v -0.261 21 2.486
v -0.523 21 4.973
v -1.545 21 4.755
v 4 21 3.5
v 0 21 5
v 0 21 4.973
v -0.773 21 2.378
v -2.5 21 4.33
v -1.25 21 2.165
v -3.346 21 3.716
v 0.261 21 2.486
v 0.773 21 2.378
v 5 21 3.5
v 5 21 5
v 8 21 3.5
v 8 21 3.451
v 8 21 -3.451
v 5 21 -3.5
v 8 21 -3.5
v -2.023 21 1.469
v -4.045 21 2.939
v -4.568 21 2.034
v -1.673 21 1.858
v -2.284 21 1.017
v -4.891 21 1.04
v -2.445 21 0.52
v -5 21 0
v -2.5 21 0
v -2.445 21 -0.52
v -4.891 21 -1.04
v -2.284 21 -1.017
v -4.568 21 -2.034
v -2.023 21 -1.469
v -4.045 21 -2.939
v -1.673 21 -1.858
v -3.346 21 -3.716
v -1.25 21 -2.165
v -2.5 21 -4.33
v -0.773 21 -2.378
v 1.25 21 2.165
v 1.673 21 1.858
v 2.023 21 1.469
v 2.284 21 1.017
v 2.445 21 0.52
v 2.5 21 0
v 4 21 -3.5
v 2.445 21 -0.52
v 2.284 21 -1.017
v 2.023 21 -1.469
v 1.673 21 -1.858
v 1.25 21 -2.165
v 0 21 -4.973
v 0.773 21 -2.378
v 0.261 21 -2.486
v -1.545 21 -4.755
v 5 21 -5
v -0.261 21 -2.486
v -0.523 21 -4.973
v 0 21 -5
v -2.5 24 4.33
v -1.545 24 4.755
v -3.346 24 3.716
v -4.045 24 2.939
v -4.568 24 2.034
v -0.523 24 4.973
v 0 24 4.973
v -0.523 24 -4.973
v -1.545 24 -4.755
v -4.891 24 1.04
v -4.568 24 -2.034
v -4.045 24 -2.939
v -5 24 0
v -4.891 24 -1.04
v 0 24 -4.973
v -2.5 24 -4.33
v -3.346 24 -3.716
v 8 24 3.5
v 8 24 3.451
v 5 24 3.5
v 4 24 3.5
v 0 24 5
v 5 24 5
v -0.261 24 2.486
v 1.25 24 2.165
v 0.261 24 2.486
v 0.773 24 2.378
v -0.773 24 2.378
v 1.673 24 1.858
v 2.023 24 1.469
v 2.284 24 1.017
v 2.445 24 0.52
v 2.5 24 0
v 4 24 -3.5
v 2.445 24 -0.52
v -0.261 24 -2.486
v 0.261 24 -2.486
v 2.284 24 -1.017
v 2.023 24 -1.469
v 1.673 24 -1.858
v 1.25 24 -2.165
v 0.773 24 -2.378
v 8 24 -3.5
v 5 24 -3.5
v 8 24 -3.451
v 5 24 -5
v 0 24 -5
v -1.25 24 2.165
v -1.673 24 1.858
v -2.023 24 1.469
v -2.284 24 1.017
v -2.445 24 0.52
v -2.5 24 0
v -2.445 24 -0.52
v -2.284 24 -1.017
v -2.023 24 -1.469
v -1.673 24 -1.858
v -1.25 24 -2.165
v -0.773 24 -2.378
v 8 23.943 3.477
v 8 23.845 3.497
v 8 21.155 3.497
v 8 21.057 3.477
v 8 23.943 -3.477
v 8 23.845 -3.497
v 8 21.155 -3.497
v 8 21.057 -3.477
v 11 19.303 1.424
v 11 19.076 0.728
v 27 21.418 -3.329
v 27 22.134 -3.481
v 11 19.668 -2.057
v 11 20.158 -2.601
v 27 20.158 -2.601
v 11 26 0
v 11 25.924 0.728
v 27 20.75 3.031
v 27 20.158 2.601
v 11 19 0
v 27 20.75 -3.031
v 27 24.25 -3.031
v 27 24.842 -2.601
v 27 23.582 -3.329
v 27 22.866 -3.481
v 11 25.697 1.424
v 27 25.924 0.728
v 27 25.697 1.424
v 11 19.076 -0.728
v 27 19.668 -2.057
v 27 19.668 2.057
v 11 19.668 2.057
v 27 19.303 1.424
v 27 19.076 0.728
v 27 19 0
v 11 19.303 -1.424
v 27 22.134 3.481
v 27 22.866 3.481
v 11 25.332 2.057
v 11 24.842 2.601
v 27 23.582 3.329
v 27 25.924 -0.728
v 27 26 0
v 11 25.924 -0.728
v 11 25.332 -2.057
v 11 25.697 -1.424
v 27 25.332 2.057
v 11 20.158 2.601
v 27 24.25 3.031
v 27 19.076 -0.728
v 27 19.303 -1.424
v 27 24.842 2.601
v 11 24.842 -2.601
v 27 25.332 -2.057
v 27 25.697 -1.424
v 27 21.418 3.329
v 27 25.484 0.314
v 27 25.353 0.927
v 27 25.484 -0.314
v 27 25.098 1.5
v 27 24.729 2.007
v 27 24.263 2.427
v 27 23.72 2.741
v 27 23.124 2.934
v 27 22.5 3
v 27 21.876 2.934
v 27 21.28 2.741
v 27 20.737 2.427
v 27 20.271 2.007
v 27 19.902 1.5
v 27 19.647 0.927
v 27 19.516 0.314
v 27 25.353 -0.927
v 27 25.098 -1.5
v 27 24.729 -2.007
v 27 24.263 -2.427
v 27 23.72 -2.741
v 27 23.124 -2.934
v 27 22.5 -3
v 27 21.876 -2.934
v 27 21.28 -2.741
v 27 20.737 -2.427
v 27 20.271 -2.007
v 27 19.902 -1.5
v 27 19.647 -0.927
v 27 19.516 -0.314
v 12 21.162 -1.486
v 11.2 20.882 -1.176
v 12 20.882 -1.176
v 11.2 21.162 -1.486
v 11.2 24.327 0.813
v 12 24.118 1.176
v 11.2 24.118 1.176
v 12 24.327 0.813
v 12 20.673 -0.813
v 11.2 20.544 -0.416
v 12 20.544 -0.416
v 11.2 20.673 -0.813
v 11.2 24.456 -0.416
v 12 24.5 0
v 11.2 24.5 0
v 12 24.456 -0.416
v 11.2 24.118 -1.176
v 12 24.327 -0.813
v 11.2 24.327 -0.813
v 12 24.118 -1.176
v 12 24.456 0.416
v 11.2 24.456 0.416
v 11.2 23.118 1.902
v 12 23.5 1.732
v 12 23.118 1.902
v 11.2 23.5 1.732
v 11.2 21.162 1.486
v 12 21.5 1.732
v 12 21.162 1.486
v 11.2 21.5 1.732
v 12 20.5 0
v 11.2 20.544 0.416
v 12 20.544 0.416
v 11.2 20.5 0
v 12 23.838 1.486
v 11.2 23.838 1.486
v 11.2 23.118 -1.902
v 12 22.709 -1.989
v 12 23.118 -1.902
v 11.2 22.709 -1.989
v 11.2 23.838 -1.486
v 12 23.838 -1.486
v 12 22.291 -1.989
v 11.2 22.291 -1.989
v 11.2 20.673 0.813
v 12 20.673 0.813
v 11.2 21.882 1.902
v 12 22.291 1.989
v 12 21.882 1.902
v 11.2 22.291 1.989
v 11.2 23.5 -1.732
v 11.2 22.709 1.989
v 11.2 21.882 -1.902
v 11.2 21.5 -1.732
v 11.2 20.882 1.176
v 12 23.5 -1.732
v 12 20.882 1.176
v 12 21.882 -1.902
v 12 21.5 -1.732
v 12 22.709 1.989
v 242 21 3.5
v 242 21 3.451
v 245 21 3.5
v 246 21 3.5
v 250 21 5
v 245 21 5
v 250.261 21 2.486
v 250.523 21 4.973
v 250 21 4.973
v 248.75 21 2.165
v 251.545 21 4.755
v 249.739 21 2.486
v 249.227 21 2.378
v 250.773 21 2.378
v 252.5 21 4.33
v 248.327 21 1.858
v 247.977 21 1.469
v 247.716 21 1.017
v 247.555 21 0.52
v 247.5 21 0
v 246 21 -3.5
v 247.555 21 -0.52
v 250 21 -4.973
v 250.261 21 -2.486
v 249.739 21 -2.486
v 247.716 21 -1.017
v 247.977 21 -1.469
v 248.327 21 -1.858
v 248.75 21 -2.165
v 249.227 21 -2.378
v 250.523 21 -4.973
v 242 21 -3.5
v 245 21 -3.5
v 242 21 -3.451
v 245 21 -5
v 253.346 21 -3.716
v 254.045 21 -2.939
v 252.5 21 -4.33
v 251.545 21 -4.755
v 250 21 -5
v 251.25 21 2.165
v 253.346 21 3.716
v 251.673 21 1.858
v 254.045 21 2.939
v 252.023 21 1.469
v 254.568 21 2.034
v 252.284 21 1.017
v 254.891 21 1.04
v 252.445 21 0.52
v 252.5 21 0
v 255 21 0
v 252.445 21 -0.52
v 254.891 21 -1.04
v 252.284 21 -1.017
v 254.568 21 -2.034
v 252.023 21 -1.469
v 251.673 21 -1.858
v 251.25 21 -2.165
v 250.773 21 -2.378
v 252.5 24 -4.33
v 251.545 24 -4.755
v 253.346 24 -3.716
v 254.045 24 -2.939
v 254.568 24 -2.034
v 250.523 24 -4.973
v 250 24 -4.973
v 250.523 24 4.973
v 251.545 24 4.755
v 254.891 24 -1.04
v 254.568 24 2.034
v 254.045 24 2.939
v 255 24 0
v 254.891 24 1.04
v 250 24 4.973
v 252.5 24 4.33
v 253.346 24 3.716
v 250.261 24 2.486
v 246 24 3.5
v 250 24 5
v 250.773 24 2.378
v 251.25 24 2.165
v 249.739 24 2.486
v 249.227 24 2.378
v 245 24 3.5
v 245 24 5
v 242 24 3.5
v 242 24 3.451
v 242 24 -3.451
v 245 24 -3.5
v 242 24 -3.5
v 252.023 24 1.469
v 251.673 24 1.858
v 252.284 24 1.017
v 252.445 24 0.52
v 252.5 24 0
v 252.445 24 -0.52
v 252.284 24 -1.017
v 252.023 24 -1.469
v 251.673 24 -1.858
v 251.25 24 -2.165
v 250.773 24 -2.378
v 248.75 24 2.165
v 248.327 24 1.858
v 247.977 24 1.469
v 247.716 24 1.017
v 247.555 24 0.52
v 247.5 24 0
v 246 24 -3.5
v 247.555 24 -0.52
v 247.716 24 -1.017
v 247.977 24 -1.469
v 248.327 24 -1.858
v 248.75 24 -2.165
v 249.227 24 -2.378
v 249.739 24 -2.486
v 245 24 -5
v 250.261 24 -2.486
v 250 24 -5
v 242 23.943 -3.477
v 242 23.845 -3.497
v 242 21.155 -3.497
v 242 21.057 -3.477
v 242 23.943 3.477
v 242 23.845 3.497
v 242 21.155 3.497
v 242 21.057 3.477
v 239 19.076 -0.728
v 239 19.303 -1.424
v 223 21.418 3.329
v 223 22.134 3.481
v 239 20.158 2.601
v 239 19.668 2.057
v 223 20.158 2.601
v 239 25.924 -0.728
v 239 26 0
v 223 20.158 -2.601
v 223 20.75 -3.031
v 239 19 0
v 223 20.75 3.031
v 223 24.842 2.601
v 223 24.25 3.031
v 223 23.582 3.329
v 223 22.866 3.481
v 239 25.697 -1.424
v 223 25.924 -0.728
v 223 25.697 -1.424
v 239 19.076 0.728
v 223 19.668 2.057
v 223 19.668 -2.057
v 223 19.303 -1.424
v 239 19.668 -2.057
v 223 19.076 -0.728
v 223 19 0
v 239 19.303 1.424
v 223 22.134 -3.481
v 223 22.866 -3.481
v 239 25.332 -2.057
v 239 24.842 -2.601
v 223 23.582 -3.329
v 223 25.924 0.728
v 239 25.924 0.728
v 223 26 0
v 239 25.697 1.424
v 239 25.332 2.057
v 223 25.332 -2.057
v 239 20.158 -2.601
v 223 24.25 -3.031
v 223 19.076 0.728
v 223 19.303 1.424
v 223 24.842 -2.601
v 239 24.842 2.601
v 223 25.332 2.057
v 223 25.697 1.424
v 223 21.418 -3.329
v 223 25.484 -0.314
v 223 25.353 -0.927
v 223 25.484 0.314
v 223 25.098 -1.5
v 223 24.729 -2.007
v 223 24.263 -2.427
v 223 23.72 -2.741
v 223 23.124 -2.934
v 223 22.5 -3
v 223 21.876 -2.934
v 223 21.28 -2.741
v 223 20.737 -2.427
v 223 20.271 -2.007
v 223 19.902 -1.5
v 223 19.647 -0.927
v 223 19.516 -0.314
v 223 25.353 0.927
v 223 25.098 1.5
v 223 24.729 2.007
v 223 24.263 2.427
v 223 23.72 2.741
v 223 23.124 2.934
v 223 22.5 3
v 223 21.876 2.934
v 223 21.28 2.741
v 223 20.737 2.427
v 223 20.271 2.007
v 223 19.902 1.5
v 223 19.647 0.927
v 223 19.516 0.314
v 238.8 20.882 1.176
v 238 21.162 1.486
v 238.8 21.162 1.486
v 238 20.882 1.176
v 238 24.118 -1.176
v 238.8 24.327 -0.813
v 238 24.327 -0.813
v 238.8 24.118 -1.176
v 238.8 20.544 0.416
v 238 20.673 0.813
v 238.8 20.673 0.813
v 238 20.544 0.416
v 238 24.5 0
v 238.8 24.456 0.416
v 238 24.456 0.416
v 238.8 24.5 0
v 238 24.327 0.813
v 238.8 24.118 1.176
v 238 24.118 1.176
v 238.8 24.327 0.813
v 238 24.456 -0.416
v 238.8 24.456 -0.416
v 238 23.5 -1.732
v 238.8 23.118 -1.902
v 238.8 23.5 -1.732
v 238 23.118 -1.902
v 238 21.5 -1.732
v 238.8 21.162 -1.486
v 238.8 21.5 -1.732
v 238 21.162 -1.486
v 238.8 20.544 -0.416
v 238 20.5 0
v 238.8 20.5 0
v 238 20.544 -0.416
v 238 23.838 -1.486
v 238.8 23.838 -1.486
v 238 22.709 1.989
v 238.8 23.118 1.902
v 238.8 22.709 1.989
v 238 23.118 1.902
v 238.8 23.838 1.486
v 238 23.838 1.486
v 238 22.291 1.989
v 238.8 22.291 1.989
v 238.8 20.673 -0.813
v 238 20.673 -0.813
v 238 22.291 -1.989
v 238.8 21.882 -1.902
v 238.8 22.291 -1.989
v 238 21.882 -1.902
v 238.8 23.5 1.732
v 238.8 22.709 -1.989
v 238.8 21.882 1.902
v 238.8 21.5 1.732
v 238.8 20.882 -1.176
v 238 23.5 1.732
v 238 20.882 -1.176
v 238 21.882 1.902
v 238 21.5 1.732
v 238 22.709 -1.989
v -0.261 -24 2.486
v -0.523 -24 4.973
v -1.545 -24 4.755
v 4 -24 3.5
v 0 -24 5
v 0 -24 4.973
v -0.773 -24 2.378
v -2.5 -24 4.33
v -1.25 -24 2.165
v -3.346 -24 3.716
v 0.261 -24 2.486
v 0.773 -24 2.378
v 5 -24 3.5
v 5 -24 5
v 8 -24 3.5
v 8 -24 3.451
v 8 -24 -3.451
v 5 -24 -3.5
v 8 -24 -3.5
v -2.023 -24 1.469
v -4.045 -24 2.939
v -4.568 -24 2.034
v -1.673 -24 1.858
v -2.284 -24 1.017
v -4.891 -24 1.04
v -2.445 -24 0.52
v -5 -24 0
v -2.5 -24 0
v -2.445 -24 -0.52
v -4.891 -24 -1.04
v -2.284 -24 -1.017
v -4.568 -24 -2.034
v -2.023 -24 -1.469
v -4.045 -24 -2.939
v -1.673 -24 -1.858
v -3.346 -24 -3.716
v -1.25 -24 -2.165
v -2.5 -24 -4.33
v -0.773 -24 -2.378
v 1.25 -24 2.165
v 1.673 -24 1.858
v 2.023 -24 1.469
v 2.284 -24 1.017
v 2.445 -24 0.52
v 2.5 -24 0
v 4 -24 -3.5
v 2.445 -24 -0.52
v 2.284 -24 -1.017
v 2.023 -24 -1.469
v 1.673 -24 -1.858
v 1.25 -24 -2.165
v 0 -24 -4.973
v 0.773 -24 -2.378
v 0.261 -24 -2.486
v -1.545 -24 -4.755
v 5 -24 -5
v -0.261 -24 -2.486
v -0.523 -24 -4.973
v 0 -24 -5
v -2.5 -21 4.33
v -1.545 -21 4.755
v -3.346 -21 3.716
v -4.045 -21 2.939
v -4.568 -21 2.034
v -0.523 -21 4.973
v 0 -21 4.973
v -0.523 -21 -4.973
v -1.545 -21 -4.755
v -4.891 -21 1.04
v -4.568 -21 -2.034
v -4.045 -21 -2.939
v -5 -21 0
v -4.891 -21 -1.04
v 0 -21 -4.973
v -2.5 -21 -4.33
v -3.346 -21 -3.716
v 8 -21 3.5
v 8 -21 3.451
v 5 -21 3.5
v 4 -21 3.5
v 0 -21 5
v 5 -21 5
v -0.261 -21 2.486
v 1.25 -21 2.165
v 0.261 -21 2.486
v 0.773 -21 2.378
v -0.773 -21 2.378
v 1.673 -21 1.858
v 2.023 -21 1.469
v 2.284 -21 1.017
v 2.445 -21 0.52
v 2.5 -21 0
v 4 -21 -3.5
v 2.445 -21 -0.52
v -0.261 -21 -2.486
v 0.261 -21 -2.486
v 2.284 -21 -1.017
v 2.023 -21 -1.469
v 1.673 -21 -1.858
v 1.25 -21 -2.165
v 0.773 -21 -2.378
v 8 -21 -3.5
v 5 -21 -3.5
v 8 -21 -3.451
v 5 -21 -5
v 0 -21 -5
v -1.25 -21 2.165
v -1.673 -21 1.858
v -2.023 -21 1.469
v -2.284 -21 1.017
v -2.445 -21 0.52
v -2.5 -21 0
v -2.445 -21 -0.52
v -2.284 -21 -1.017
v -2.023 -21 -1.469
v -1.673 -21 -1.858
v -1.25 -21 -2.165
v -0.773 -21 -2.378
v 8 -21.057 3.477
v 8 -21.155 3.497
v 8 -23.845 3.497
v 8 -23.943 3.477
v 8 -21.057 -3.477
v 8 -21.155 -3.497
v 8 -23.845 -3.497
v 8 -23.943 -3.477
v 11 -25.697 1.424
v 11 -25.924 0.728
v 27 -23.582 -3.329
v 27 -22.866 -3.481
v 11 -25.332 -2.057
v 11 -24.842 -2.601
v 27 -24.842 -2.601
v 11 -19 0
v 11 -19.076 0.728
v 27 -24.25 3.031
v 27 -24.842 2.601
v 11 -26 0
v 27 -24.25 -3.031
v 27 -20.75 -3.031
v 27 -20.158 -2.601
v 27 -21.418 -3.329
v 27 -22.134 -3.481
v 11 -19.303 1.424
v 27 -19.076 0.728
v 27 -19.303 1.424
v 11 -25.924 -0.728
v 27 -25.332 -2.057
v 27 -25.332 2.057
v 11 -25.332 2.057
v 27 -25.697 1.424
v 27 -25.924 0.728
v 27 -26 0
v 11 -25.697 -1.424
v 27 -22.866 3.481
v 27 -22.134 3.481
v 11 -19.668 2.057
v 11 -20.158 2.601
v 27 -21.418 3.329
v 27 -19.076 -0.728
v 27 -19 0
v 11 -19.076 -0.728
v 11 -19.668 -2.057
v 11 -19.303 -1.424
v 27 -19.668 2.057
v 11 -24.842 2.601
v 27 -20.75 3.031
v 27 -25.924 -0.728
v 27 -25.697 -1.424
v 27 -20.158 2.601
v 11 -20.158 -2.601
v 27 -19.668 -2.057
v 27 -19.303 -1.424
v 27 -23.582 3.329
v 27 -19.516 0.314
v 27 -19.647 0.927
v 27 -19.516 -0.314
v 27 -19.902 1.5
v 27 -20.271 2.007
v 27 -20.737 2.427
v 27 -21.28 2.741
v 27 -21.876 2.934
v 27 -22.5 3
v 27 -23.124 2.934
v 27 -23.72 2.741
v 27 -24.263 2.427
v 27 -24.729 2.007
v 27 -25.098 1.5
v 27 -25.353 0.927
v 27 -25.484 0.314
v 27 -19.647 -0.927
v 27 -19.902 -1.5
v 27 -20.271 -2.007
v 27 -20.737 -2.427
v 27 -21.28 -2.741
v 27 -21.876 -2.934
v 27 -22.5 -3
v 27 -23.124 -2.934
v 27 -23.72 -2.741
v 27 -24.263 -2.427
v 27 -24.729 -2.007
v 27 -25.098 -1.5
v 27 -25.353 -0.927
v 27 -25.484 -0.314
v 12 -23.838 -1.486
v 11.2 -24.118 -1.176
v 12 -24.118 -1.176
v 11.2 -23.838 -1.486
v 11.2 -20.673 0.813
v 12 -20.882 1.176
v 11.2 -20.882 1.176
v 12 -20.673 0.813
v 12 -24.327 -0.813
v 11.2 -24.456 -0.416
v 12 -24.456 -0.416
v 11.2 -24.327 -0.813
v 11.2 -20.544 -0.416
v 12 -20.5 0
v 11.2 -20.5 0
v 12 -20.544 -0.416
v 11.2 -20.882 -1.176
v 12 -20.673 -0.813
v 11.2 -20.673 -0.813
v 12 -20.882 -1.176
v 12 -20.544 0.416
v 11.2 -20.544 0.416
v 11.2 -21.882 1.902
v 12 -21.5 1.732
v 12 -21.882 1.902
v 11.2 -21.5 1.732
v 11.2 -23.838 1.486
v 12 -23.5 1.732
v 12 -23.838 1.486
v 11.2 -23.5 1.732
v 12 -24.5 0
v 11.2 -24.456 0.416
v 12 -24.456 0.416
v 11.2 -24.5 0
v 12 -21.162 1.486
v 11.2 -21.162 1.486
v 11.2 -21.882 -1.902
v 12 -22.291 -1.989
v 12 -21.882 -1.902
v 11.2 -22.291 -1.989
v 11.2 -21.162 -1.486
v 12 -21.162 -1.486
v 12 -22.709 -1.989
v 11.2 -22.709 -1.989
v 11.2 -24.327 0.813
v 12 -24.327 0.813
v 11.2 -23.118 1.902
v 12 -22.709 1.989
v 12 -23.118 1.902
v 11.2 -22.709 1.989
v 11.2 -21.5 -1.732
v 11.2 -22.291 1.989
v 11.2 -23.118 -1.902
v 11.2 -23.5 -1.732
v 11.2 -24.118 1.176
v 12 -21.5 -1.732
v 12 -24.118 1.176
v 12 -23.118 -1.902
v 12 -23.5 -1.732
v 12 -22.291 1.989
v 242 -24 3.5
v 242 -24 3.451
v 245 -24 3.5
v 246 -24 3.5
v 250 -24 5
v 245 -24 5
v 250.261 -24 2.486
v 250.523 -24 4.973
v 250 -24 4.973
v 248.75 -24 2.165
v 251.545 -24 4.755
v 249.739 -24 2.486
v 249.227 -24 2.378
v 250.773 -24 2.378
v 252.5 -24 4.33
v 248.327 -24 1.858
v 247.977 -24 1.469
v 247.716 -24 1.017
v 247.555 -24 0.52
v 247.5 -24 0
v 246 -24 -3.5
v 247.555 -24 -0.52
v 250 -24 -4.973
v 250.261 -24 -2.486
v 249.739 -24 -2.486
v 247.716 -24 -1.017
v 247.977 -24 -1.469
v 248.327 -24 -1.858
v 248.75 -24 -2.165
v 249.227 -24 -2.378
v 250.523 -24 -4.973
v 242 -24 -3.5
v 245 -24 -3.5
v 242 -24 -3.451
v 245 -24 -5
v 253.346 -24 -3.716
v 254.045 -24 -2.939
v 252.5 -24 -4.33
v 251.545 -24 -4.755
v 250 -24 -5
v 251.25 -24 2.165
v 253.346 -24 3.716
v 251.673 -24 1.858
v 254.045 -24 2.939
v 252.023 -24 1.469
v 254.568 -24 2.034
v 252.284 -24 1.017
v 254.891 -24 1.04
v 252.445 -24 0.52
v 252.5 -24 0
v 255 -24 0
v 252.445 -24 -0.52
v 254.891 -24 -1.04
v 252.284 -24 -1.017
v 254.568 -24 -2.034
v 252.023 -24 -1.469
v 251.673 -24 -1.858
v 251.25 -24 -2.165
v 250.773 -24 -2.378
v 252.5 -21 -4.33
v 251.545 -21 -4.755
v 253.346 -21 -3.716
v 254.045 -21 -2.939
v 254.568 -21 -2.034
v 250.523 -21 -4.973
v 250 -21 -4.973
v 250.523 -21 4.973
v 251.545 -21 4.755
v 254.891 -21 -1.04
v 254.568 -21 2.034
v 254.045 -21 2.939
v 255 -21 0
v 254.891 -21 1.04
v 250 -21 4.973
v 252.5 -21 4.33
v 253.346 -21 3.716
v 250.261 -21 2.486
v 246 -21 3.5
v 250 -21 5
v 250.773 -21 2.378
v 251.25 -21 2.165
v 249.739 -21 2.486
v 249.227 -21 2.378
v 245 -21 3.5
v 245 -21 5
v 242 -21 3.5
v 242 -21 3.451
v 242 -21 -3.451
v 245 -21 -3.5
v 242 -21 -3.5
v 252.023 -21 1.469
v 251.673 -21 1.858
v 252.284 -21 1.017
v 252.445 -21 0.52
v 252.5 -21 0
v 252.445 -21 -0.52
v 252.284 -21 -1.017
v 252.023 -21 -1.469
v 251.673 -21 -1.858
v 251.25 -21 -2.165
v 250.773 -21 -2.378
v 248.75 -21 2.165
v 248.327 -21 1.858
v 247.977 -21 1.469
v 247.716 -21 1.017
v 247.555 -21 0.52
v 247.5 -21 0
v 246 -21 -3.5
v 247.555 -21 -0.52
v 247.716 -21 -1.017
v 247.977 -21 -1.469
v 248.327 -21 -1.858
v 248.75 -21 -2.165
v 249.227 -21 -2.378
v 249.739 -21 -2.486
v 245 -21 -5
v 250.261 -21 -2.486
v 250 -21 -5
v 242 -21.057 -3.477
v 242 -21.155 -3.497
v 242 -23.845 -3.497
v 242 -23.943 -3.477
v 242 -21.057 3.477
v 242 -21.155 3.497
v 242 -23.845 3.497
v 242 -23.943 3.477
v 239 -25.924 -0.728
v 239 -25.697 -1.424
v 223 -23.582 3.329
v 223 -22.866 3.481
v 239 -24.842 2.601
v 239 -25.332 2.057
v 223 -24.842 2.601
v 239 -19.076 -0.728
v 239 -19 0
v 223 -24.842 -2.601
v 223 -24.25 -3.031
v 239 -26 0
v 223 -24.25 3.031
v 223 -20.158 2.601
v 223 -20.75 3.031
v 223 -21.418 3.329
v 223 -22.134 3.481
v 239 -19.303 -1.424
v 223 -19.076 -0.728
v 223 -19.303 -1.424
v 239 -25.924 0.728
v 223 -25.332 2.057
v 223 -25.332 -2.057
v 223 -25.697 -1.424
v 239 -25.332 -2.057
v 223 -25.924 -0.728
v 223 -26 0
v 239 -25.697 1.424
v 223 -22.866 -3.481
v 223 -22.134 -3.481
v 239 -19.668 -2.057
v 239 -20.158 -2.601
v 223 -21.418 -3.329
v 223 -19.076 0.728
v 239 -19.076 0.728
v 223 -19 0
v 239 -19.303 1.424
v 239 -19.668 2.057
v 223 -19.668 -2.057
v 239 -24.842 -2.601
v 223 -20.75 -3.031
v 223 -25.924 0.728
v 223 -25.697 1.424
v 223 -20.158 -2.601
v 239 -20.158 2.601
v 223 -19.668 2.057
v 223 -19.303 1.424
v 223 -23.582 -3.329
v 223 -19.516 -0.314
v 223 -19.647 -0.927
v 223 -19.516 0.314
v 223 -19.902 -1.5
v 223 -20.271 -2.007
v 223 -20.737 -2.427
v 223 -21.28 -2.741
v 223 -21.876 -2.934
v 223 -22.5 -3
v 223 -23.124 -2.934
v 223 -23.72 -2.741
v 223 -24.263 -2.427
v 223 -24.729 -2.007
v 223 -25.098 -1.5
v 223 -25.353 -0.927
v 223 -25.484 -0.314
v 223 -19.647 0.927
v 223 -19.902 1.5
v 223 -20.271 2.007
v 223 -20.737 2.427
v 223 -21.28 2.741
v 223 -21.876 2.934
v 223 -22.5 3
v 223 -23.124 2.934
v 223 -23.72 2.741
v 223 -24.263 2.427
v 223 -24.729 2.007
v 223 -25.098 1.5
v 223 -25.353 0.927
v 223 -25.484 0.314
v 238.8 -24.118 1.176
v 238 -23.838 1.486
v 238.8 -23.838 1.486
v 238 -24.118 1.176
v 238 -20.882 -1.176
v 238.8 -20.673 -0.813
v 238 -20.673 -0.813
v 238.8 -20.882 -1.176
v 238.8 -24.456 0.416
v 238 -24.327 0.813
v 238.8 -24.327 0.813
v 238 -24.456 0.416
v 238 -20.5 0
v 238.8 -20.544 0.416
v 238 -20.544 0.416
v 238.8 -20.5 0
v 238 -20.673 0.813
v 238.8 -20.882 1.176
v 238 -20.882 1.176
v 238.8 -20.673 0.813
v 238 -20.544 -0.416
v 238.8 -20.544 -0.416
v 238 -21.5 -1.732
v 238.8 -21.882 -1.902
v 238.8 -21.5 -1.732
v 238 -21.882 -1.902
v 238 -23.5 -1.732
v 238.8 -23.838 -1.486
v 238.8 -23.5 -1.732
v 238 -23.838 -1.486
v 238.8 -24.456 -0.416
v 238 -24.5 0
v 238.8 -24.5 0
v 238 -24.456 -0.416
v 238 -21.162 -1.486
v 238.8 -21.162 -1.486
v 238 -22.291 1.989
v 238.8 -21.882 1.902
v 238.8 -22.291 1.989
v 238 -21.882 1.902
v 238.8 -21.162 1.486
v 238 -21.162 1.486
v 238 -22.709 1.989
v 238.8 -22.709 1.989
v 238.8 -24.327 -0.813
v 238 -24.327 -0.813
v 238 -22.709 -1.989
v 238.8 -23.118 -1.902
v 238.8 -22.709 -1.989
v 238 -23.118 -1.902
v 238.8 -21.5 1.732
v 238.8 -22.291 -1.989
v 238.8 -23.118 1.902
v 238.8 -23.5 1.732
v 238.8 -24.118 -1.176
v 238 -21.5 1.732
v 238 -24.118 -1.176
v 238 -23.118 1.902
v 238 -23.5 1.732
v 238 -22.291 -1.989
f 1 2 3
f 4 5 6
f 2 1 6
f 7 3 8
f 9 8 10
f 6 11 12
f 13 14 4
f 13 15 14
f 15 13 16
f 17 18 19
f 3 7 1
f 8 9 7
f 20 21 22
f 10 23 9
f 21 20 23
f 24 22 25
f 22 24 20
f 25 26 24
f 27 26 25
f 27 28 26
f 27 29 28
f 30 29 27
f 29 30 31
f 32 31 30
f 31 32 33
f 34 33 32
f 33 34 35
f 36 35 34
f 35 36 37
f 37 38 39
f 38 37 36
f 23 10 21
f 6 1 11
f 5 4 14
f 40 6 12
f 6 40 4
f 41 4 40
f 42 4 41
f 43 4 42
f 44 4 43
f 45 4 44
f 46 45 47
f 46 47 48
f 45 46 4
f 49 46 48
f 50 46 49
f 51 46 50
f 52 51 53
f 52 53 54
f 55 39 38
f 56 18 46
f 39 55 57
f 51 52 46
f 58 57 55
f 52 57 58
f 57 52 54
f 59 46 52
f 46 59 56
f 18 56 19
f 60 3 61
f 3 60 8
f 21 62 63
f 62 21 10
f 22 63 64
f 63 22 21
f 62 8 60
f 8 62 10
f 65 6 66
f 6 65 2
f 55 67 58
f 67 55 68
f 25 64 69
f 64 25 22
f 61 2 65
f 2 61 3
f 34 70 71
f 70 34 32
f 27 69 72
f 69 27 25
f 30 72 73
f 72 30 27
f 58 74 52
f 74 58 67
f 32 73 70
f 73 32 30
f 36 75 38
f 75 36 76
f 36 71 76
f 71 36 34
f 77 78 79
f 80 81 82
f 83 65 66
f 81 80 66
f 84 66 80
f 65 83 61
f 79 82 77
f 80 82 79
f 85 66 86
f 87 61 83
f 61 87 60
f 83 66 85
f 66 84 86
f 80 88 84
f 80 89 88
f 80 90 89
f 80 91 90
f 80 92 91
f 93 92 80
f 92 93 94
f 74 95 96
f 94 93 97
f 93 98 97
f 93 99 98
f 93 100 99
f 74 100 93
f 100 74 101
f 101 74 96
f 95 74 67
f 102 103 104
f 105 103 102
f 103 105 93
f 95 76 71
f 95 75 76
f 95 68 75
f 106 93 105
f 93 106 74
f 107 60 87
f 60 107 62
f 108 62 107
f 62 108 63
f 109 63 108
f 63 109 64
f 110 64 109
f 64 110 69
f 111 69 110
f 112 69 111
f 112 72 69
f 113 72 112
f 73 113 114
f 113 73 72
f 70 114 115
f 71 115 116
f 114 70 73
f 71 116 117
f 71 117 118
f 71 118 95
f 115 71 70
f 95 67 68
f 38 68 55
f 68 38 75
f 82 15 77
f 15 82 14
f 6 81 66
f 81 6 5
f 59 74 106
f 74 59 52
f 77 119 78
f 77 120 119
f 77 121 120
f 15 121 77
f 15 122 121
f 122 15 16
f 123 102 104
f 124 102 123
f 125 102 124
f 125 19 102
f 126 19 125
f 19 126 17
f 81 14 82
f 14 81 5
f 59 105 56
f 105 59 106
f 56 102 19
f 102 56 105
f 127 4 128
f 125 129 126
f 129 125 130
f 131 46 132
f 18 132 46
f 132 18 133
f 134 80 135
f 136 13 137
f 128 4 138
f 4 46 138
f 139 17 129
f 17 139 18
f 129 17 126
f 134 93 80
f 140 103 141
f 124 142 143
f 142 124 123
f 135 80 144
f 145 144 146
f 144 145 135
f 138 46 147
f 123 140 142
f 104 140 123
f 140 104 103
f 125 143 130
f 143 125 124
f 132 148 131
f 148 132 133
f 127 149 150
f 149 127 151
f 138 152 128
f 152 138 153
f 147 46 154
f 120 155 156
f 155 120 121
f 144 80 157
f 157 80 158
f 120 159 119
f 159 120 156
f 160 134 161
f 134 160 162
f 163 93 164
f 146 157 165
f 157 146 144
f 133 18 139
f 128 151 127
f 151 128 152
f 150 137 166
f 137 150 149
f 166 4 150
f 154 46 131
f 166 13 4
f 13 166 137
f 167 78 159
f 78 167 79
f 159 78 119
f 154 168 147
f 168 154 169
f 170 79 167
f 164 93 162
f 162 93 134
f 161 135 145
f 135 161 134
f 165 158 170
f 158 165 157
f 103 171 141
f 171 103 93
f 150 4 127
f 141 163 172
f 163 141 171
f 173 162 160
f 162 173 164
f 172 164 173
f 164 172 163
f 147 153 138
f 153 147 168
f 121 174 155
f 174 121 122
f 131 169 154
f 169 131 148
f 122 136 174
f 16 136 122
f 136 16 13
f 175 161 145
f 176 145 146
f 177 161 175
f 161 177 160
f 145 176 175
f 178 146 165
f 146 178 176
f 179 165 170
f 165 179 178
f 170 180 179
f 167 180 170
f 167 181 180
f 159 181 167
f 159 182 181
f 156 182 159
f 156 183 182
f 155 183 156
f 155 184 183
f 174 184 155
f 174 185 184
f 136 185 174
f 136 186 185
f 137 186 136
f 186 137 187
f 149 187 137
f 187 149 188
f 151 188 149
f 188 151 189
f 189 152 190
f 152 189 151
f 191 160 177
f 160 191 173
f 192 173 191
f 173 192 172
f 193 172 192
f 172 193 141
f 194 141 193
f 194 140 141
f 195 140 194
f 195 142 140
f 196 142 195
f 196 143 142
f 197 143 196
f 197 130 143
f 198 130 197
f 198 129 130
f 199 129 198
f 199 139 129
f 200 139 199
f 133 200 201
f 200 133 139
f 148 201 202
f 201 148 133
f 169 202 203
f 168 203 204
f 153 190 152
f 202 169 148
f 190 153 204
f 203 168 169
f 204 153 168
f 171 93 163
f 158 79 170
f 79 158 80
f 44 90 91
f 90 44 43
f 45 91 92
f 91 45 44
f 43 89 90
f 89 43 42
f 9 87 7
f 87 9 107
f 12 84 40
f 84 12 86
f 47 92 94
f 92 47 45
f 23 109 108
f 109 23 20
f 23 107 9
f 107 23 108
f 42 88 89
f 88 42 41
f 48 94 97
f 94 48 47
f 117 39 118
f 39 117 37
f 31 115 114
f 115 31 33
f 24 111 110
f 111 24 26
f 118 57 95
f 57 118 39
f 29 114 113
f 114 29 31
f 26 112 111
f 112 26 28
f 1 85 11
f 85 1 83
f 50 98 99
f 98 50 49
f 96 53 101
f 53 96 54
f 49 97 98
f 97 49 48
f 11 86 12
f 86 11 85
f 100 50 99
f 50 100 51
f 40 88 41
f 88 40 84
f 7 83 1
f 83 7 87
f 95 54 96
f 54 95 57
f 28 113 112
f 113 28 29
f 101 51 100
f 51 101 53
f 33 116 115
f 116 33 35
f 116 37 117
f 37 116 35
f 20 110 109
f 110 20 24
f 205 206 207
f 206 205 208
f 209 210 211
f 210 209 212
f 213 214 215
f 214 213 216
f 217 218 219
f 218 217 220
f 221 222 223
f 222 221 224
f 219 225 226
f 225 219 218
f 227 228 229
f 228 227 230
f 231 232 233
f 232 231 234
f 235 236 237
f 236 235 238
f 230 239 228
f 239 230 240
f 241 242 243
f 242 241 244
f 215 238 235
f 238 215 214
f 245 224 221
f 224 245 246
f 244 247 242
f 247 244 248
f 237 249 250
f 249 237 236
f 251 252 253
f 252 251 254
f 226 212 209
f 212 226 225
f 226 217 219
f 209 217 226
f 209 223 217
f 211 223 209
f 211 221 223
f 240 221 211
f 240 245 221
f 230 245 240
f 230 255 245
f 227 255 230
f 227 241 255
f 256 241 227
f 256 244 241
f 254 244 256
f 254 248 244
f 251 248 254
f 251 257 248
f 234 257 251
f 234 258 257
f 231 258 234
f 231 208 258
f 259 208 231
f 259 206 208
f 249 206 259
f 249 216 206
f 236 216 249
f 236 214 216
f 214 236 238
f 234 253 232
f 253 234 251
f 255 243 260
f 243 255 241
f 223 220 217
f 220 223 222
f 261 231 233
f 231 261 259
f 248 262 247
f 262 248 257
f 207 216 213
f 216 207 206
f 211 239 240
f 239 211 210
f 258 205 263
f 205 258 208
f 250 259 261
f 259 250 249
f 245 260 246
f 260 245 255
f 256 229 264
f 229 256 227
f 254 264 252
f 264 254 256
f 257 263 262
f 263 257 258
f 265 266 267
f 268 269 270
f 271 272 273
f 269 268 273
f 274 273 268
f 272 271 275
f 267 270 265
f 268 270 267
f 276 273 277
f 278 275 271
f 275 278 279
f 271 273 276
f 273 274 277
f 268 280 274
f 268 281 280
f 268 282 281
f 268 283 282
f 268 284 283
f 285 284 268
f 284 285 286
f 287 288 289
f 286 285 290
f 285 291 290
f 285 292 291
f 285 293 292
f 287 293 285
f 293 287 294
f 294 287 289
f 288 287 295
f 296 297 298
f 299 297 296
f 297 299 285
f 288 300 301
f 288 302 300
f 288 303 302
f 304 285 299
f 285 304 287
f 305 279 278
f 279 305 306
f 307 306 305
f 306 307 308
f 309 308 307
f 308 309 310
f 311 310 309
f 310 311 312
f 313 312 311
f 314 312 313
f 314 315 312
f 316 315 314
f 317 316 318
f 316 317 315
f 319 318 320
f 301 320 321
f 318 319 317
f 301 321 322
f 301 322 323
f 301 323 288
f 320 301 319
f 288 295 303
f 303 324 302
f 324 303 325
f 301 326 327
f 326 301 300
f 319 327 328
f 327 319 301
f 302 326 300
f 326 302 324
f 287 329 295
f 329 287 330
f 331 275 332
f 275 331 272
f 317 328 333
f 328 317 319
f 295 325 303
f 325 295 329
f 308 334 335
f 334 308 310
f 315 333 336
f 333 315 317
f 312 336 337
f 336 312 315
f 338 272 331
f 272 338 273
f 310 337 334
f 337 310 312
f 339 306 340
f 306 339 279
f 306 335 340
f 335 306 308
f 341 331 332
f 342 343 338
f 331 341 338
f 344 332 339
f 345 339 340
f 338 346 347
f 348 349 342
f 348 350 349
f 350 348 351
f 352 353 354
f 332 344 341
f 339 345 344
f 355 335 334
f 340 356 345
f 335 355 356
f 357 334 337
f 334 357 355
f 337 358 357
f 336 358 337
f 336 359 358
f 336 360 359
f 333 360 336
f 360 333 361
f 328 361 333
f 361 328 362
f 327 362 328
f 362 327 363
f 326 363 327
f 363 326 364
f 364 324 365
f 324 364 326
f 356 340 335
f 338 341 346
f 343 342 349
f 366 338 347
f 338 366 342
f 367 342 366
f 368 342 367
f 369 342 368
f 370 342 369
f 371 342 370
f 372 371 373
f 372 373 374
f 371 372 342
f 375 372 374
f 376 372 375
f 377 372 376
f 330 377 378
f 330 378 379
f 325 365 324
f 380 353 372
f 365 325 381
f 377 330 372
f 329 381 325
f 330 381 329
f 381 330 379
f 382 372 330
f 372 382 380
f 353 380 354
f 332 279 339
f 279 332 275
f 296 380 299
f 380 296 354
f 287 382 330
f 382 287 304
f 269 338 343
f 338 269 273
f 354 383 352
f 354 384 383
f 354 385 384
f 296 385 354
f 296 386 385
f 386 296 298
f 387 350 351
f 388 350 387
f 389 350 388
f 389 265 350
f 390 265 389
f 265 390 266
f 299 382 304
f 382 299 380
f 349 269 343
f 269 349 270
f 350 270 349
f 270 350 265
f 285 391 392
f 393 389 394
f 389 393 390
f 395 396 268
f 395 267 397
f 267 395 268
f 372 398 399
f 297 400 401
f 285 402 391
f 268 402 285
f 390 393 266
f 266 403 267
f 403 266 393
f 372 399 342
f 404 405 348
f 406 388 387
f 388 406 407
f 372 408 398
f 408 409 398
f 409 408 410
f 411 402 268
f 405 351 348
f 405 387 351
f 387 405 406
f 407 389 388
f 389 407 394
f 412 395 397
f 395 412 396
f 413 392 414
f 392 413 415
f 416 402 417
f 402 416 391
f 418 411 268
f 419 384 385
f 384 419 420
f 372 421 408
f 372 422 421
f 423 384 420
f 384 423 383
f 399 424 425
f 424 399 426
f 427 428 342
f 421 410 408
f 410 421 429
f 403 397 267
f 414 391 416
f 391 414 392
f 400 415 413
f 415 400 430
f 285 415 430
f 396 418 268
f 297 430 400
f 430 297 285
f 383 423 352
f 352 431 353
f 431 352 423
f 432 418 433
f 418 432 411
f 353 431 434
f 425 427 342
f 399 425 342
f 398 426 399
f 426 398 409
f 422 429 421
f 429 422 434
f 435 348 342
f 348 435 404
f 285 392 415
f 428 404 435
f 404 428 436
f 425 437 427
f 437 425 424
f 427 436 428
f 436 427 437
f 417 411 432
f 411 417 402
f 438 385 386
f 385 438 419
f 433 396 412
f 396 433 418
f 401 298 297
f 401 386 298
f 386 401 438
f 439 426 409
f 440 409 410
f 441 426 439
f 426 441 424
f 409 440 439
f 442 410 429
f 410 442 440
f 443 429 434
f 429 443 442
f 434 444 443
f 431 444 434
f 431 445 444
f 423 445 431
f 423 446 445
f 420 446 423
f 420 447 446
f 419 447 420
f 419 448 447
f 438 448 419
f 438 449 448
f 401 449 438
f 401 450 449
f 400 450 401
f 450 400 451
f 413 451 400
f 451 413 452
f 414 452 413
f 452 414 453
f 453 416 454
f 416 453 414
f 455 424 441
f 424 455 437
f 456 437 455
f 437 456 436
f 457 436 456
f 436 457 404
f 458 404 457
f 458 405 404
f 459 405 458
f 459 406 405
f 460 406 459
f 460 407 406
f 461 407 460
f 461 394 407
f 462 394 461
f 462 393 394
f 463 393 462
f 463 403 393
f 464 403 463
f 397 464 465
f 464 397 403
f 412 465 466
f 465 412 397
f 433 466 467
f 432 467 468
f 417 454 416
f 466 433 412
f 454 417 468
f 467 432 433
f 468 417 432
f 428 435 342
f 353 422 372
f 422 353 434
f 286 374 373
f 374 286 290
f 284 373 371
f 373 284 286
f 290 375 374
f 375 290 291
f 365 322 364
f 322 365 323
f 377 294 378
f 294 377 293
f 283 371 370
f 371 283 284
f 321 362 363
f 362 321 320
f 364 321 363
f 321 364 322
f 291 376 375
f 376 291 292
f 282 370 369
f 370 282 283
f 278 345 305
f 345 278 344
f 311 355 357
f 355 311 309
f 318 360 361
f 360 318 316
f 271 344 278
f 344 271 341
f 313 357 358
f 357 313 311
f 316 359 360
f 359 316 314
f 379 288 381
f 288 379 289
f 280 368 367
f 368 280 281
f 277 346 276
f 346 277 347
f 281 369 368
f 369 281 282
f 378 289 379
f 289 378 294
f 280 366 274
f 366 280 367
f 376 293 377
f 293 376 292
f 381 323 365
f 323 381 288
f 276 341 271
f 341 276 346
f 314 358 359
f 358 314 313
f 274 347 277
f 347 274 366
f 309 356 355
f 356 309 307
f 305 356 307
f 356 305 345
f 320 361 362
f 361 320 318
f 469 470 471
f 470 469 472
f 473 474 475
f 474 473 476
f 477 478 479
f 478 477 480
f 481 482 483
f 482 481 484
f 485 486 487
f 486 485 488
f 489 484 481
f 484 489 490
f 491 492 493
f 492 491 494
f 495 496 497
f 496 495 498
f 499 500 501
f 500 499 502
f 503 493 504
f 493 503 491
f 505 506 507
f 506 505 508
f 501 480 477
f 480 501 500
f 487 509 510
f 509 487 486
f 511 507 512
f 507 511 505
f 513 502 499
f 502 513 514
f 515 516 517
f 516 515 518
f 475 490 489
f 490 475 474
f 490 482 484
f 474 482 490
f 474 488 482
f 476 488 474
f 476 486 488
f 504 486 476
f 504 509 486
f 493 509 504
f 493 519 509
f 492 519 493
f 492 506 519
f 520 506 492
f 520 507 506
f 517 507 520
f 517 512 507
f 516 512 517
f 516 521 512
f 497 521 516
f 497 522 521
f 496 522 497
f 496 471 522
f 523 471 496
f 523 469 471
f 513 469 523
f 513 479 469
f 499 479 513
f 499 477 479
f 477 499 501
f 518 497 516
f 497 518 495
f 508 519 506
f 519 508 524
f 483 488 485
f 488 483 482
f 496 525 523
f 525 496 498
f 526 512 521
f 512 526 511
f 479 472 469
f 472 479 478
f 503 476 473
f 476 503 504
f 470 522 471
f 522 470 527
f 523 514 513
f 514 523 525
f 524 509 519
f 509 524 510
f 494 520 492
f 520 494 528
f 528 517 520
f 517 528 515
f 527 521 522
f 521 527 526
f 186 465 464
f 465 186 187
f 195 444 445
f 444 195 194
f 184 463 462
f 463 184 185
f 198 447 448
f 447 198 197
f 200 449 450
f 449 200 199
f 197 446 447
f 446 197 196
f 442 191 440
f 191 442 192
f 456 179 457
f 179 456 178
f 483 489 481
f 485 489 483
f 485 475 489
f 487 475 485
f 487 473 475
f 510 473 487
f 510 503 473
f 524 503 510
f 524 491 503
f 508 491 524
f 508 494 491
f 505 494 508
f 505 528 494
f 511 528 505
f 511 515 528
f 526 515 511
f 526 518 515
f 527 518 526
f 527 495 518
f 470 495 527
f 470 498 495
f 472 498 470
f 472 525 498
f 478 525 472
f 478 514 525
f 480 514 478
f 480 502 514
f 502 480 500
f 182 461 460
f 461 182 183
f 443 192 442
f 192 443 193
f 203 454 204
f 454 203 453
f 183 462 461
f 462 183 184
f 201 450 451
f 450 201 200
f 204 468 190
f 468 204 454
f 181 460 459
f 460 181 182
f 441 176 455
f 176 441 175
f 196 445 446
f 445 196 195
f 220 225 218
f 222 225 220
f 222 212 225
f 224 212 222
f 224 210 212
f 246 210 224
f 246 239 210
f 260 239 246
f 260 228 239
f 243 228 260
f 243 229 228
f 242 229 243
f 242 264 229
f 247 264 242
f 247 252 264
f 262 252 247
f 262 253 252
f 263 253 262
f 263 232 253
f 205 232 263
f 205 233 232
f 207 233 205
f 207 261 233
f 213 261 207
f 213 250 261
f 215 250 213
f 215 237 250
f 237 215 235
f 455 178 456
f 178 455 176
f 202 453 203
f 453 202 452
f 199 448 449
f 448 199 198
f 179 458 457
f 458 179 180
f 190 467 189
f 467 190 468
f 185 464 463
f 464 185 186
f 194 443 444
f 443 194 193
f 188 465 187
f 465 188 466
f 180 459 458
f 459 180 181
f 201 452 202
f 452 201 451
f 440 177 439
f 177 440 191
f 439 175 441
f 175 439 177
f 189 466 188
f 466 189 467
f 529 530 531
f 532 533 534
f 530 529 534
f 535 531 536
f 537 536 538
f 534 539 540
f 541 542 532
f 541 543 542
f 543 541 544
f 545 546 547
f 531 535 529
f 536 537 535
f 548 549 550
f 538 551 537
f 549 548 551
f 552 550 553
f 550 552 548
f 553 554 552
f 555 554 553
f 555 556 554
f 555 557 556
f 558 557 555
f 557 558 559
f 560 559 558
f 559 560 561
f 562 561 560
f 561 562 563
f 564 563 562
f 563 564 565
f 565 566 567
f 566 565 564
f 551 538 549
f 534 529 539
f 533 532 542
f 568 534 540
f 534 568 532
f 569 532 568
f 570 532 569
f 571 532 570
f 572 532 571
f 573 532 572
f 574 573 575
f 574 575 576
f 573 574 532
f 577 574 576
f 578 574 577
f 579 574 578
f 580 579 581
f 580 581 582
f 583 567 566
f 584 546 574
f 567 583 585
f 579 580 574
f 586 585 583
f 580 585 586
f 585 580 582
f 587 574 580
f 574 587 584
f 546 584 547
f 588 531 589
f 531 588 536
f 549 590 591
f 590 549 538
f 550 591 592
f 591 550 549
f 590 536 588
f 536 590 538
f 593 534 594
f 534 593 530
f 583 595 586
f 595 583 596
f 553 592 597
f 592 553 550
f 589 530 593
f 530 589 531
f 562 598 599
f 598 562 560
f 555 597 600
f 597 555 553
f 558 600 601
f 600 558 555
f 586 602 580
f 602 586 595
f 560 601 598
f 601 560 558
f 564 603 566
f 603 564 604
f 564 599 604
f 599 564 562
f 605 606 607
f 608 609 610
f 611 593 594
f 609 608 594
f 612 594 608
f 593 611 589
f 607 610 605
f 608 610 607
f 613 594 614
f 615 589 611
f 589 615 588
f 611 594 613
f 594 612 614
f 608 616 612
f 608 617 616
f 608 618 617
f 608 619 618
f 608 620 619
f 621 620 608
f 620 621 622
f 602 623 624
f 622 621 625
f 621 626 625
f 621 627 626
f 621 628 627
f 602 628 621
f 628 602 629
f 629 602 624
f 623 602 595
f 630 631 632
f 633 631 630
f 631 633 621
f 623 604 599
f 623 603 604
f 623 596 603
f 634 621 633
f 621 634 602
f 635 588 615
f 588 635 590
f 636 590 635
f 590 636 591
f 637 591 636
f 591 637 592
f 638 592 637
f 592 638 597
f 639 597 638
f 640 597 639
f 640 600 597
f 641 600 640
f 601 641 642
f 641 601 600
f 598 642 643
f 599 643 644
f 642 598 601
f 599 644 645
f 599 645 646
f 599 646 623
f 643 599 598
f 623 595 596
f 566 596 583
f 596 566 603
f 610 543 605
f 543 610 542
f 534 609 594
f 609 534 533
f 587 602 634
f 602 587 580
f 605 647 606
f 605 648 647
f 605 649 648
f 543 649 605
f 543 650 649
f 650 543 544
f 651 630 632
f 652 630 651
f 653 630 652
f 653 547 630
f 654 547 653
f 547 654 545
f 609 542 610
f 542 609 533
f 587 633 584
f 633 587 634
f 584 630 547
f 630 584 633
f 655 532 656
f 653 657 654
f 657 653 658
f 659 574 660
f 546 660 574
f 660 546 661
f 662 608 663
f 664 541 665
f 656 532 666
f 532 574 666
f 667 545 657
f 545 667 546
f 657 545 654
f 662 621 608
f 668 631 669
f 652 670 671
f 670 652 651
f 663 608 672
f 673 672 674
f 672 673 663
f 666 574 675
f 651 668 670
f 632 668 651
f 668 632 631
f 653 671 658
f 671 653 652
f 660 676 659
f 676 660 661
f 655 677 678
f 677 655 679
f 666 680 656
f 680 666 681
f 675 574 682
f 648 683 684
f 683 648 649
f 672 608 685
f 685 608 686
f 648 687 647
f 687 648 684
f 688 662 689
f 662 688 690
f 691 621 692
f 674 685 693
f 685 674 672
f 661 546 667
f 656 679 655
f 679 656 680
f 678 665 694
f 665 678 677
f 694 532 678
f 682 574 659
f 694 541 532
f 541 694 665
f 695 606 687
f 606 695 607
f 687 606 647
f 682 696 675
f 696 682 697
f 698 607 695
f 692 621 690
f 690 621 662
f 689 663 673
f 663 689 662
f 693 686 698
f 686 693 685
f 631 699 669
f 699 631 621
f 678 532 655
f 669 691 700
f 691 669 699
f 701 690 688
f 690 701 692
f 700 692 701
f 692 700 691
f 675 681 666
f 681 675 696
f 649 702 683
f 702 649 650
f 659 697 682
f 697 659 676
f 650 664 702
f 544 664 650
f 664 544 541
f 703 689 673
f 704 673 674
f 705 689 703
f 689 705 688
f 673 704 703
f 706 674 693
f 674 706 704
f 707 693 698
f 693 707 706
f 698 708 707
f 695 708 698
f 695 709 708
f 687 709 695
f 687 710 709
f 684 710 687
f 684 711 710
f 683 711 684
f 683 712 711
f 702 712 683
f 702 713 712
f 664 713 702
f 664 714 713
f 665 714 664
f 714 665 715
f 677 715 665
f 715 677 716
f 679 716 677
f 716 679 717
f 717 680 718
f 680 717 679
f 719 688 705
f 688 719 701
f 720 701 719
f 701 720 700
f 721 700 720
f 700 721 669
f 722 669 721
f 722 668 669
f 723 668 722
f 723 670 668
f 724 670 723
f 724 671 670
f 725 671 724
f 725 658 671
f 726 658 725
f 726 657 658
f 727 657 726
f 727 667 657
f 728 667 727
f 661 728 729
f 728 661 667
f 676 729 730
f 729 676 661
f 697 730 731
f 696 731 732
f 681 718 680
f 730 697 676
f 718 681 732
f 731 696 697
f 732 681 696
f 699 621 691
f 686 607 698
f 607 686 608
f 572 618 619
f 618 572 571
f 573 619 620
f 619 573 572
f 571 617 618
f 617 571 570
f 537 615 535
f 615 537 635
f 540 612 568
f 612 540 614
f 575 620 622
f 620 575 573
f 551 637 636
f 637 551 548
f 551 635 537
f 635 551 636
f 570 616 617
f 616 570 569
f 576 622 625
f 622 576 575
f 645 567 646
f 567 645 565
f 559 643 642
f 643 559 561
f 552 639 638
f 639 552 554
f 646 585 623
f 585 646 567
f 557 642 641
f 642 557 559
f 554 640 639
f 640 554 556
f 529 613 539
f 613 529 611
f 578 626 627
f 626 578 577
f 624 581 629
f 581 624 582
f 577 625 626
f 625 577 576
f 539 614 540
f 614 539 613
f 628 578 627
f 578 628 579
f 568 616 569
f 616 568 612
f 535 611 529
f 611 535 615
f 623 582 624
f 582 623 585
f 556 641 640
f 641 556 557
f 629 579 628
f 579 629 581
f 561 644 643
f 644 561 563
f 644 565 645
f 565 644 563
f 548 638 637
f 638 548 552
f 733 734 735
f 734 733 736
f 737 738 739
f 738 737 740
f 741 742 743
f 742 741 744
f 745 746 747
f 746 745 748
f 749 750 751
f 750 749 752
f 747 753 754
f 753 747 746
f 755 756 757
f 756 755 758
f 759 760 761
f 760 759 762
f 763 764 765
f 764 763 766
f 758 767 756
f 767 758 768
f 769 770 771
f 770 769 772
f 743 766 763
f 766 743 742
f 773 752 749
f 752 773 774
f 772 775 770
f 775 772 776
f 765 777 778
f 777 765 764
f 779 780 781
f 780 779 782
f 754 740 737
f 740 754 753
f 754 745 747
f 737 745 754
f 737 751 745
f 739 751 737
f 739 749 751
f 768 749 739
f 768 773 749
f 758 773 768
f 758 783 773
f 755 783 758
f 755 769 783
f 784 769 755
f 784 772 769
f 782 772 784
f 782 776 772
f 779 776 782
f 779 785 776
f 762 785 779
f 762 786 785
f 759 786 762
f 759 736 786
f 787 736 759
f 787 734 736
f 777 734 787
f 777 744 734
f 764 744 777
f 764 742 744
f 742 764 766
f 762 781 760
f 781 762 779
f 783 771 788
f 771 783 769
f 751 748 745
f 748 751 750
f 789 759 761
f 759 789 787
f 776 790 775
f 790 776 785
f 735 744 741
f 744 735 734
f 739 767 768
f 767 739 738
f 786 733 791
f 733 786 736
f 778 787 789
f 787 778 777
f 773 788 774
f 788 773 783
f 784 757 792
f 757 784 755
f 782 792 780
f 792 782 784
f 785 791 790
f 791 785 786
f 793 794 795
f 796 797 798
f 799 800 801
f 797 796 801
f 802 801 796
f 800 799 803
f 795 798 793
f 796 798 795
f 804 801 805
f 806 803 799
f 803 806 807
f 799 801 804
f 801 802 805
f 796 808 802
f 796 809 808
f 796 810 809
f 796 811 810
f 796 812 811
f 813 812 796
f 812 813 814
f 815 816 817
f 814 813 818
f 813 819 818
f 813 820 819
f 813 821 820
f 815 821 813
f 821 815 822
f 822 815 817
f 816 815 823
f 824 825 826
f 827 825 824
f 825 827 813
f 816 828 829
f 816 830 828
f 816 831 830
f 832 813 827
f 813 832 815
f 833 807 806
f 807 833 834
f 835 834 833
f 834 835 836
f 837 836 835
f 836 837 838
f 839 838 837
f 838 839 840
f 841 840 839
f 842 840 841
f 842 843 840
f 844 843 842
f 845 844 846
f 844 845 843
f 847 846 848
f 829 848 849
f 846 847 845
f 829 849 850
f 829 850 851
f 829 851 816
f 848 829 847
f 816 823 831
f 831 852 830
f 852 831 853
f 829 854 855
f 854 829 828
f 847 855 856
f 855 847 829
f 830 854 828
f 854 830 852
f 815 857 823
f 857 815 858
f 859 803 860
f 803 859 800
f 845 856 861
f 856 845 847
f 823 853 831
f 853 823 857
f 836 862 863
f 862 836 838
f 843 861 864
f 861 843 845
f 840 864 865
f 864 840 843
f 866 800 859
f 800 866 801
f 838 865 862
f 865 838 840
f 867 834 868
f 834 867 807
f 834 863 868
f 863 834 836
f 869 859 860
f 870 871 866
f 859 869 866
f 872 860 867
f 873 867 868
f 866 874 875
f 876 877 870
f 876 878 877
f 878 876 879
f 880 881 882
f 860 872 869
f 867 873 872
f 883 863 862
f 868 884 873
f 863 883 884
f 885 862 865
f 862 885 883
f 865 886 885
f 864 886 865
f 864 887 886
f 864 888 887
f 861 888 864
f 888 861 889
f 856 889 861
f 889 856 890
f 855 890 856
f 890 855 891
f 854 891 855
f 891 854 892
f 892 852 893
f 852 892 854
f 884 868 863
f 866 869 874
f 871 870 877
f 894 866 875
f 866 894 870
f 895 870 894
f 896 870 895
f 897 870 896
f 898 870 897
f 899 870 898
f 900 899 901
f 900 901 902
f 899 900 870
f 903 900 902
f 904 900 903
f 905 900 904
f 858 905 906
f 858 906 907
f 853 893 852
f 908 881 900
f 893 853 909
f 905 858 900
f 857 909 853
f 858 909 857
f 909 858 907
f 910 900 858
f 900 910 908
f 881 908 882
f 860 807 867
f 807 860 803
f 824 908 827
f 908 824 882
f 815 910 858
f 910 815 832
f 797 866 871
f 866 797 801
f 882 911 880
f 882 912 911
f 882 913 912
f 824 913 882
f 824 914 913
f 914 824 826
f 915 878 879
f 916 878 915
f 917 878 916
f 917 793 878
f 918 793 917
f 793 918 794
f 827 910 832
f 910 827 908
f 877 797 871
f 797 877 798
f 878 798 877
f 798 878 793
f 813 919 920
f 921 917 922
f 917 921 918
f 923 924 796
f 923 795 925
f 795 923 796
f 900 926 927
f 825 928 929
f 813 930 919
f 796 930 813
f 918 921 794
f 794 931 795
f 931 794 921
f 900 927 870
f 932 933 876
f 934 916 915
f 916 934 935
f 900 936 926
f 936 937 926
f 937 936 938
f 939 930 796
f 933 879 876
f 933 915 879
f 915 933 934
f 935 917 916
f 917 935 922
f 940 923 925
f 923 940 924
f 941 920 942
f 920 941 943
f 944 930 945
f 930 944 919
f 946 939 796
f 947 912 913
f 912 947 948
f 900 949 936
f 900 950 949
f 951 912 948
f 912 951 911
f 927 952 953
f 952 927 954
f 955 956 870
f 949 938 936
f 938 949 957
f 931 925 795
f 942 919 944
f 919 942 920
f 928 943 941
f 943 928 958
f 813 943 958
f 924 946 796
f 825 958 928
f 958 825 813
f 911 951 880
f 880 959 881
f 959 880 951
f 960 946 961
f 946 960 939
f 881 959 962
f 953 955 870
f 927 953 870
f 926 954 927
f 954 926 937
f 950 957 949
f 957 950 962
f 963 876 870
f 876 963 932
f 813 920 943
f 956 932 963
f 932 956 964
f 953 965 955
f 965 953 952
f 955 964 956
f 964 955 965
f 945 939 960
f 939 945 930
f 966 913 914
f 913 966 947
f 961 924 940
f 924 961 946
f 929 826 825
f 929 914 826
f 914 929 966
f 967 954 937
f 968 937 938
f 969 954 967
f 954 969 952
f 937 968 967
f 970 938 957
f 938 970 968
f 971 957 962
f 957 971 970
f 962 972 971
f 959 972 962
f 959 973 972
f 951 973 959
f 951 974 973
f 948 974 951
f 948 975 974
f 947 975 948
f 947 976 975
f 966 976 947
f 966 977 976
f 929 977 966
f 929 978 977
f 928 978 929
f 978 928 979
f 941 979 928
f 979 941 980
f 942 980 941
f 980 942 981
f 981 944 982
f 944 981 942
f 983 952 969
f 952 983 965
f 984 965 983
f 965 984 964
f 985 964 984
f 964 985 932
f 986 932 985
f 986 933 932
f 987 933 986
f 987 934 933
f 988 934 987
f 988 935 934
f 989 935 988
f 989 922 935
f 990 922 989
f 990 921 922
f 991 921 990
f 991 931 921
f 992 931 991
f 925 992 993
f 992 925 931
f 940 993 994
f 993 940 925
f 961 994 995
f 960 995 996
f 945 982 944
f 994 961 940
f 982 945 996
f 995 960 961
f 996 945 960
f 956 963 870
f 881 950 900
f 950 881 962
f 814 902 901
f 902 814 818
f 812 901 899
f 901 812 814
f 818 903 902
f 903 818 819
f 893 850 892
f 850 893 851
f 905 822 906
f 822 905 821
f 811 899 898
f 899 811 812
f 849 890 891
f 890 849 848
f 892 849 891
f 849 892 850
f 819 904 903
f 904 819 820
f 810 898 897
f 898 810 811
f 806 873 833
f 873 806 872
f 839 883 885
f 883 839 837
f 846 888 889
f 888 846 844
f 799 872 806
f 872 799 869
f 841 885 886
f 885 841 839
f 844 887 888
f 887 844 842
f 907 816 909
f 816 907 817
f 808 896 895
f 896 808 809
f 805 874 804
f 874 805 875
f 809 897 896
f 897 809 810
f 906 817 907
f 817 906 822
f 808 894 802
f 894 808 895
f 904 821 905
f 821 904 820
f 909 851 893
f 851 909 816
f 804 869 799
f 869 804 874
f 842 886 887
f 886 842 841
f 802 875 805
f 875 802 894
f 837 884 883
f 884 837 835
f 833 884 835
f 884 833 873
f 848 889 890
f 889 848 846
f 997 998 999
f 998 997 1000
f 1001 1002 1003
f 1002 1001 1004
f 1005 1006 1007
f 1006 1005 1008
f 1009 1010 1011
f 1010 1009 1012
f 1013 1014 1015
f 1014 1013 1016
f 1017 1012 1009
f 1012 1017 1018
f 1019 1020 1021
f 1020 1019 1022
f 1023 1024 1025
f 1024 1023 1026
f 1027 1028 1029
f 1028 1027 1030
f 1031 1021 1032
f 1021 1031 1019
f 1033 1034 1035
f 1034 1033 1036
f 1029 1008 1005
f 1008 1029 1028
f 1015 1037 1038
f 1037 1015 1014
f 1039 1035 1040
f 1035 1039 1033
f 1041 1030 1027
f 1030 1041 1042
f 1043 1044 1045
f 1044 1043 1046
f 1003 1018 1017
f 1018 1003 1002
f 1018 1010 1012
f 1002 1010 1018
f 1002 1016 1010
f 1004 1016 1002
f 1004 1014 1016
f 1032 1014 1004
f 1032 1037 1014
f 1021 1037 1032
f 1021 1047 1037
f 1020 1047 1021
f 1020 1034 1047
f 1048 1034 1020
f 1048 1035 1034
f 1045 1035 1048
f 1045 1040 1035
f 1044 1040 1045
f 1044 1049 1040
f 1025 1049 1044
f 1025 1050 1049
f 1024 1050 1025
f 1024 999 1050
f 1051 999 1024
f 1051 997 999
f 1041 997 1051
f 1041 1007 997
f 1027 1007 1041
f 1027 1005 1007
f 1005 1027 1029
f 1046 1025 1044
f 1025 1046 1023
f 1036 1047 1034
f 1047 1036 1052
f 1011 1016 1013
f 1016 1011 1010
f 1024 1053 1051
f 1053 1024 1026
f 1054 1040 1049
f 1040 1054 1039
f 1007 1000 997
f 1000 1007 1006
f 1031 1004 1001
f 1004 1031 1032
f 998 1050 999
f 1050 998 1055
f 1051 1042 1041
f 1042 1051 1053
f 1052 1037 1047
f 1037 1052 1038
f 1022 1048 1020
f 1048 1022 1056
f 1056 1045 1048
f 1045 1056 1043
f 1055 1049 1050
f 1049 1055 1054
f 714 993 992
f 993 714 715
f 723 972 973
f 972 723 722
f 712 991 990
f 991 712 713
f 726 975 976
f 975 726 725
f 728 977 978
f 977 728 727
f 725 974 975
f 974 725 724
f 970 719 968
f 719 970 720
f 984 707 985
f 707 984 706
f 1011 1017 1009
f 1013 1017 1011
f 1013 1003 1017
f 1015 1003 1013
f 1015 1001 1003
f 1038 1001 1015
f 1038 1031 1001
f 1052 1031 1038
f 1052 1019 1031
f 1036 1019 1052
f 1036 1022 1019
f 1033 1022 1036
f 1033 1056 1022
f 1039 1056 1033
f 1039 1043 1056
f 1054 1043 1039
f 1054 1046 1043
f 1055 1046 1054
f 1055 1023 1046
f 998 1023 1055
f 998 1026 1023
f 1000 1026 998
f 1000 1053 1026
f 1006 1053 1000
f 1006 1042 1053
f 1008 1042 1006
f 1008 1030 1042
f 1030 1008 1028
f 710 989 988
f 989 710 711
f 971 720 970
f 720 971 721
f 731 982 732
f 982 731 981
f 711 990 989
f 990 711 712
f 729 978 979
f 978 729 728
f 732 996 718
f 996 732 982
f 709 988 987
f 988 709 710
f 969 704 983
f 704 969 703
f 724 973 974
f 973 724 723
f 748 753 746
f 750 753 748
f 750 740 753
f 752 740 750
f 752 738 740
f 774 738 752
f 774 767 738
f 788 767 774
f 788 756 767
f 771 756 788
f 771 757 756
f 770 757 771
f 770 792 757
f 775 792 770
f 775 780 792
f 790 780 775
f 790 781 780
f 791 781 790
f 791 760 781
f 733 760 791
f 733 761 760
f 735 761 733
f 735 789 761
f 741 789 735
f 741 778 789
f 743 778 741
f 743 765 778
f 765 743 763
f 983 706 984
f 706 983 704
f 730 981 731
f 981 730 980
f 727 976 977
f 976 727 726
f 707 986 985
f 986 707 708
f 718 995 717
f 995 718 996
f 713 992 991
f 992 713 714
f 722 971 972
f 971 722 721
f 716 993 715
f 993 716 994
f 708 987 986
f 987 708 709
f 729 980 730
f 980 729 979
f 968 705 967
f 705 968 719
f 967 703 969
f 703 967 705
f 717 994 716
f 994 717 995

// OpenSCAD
// file: ../components/traxxas_5525.scad
module traxxas_5525(){
	difference(){
		union(){
			cylinder(h=3,r=5,center=true,$fn=30);
			hull(){
				translate([0,-5,-1.5]) cube([5,10,3]);
				translate([7,-3.5,-1.5]) cube([1,7,3]);
			}
			hull(){
				translate([4,-3.5,-1.5]) cube([1,7,3]);
				translate([11,0,0]) rotate([0,90,0]) cylinder(h=16,r=3.5,$fn=30);
			}
		}
		cylinder(h=6,r=2.5,center=true,$fn=30);		
		translate([11.2,0,0]) rotate([0,90,0]) cylinder(h=16,r=2,$fn=30);
	}
}
// main file
include <../components/traxxas_5525.scad>

module rod_end(){
	traxxas_5525();
}

module rod_end_bearing(){
	color("silver") difference(){
		union(){
			rotate([90,0,0]) cylinder(r=2,h=8,center=true,$fn=30);
			translate([0,3.8,0]) rotate([90,0,0]) cylinder(0.4,2.5,2,center=true,$fn=30);
			translate([0,-3,0]) rotate([90,0,0]) cylinder(2,2,2.5,center=true,$fn=30);
			sphere(r=2.5,$fn=30);
		}
		rotate([90,0,0]) cylinder(r=1.5,h=10,center=true,$fn=30);
	}
}

module effector_rod(){
//	rod_end_bearing();
//	translate([250,0,0]) rod_end_bearing();
	union(){
		color("black") rotate([90,0,0]) rod_end();
		color("black") translate([250,0,0]) rotate([90,180,0]) rod_end();
		color("grey") translate([125,0,0]) rotate([0,90,0]) cylinder(h=226,r=3,center=true,$fn=30);
	}
}
module effector_rods(){
	union(){
	translate([0,22.5,0]) union(){
		color("black") rotate([90,0,0]) rod_end();
		color("black") translate([250,0,0]) rotate([90,180,0]) rod_end();
		color("grey") translate([125,0,0]) rotate([0,90,0]) cylinder(h=226,r=3,center=true,$fn=30);
	}
	translate([0,-22.5,0]) union(){
		color("black") rotate([90,0,0]) rod_end();
		color("black") translate([250,0,0]) rotate([90,180,0]) rod_end();
		color("grey") translate([125,0,0]) rotate([0,90,0]) cylinder(h=226,r=3,center=true,$fn=30);
	}
	}
}
effector_rods();
